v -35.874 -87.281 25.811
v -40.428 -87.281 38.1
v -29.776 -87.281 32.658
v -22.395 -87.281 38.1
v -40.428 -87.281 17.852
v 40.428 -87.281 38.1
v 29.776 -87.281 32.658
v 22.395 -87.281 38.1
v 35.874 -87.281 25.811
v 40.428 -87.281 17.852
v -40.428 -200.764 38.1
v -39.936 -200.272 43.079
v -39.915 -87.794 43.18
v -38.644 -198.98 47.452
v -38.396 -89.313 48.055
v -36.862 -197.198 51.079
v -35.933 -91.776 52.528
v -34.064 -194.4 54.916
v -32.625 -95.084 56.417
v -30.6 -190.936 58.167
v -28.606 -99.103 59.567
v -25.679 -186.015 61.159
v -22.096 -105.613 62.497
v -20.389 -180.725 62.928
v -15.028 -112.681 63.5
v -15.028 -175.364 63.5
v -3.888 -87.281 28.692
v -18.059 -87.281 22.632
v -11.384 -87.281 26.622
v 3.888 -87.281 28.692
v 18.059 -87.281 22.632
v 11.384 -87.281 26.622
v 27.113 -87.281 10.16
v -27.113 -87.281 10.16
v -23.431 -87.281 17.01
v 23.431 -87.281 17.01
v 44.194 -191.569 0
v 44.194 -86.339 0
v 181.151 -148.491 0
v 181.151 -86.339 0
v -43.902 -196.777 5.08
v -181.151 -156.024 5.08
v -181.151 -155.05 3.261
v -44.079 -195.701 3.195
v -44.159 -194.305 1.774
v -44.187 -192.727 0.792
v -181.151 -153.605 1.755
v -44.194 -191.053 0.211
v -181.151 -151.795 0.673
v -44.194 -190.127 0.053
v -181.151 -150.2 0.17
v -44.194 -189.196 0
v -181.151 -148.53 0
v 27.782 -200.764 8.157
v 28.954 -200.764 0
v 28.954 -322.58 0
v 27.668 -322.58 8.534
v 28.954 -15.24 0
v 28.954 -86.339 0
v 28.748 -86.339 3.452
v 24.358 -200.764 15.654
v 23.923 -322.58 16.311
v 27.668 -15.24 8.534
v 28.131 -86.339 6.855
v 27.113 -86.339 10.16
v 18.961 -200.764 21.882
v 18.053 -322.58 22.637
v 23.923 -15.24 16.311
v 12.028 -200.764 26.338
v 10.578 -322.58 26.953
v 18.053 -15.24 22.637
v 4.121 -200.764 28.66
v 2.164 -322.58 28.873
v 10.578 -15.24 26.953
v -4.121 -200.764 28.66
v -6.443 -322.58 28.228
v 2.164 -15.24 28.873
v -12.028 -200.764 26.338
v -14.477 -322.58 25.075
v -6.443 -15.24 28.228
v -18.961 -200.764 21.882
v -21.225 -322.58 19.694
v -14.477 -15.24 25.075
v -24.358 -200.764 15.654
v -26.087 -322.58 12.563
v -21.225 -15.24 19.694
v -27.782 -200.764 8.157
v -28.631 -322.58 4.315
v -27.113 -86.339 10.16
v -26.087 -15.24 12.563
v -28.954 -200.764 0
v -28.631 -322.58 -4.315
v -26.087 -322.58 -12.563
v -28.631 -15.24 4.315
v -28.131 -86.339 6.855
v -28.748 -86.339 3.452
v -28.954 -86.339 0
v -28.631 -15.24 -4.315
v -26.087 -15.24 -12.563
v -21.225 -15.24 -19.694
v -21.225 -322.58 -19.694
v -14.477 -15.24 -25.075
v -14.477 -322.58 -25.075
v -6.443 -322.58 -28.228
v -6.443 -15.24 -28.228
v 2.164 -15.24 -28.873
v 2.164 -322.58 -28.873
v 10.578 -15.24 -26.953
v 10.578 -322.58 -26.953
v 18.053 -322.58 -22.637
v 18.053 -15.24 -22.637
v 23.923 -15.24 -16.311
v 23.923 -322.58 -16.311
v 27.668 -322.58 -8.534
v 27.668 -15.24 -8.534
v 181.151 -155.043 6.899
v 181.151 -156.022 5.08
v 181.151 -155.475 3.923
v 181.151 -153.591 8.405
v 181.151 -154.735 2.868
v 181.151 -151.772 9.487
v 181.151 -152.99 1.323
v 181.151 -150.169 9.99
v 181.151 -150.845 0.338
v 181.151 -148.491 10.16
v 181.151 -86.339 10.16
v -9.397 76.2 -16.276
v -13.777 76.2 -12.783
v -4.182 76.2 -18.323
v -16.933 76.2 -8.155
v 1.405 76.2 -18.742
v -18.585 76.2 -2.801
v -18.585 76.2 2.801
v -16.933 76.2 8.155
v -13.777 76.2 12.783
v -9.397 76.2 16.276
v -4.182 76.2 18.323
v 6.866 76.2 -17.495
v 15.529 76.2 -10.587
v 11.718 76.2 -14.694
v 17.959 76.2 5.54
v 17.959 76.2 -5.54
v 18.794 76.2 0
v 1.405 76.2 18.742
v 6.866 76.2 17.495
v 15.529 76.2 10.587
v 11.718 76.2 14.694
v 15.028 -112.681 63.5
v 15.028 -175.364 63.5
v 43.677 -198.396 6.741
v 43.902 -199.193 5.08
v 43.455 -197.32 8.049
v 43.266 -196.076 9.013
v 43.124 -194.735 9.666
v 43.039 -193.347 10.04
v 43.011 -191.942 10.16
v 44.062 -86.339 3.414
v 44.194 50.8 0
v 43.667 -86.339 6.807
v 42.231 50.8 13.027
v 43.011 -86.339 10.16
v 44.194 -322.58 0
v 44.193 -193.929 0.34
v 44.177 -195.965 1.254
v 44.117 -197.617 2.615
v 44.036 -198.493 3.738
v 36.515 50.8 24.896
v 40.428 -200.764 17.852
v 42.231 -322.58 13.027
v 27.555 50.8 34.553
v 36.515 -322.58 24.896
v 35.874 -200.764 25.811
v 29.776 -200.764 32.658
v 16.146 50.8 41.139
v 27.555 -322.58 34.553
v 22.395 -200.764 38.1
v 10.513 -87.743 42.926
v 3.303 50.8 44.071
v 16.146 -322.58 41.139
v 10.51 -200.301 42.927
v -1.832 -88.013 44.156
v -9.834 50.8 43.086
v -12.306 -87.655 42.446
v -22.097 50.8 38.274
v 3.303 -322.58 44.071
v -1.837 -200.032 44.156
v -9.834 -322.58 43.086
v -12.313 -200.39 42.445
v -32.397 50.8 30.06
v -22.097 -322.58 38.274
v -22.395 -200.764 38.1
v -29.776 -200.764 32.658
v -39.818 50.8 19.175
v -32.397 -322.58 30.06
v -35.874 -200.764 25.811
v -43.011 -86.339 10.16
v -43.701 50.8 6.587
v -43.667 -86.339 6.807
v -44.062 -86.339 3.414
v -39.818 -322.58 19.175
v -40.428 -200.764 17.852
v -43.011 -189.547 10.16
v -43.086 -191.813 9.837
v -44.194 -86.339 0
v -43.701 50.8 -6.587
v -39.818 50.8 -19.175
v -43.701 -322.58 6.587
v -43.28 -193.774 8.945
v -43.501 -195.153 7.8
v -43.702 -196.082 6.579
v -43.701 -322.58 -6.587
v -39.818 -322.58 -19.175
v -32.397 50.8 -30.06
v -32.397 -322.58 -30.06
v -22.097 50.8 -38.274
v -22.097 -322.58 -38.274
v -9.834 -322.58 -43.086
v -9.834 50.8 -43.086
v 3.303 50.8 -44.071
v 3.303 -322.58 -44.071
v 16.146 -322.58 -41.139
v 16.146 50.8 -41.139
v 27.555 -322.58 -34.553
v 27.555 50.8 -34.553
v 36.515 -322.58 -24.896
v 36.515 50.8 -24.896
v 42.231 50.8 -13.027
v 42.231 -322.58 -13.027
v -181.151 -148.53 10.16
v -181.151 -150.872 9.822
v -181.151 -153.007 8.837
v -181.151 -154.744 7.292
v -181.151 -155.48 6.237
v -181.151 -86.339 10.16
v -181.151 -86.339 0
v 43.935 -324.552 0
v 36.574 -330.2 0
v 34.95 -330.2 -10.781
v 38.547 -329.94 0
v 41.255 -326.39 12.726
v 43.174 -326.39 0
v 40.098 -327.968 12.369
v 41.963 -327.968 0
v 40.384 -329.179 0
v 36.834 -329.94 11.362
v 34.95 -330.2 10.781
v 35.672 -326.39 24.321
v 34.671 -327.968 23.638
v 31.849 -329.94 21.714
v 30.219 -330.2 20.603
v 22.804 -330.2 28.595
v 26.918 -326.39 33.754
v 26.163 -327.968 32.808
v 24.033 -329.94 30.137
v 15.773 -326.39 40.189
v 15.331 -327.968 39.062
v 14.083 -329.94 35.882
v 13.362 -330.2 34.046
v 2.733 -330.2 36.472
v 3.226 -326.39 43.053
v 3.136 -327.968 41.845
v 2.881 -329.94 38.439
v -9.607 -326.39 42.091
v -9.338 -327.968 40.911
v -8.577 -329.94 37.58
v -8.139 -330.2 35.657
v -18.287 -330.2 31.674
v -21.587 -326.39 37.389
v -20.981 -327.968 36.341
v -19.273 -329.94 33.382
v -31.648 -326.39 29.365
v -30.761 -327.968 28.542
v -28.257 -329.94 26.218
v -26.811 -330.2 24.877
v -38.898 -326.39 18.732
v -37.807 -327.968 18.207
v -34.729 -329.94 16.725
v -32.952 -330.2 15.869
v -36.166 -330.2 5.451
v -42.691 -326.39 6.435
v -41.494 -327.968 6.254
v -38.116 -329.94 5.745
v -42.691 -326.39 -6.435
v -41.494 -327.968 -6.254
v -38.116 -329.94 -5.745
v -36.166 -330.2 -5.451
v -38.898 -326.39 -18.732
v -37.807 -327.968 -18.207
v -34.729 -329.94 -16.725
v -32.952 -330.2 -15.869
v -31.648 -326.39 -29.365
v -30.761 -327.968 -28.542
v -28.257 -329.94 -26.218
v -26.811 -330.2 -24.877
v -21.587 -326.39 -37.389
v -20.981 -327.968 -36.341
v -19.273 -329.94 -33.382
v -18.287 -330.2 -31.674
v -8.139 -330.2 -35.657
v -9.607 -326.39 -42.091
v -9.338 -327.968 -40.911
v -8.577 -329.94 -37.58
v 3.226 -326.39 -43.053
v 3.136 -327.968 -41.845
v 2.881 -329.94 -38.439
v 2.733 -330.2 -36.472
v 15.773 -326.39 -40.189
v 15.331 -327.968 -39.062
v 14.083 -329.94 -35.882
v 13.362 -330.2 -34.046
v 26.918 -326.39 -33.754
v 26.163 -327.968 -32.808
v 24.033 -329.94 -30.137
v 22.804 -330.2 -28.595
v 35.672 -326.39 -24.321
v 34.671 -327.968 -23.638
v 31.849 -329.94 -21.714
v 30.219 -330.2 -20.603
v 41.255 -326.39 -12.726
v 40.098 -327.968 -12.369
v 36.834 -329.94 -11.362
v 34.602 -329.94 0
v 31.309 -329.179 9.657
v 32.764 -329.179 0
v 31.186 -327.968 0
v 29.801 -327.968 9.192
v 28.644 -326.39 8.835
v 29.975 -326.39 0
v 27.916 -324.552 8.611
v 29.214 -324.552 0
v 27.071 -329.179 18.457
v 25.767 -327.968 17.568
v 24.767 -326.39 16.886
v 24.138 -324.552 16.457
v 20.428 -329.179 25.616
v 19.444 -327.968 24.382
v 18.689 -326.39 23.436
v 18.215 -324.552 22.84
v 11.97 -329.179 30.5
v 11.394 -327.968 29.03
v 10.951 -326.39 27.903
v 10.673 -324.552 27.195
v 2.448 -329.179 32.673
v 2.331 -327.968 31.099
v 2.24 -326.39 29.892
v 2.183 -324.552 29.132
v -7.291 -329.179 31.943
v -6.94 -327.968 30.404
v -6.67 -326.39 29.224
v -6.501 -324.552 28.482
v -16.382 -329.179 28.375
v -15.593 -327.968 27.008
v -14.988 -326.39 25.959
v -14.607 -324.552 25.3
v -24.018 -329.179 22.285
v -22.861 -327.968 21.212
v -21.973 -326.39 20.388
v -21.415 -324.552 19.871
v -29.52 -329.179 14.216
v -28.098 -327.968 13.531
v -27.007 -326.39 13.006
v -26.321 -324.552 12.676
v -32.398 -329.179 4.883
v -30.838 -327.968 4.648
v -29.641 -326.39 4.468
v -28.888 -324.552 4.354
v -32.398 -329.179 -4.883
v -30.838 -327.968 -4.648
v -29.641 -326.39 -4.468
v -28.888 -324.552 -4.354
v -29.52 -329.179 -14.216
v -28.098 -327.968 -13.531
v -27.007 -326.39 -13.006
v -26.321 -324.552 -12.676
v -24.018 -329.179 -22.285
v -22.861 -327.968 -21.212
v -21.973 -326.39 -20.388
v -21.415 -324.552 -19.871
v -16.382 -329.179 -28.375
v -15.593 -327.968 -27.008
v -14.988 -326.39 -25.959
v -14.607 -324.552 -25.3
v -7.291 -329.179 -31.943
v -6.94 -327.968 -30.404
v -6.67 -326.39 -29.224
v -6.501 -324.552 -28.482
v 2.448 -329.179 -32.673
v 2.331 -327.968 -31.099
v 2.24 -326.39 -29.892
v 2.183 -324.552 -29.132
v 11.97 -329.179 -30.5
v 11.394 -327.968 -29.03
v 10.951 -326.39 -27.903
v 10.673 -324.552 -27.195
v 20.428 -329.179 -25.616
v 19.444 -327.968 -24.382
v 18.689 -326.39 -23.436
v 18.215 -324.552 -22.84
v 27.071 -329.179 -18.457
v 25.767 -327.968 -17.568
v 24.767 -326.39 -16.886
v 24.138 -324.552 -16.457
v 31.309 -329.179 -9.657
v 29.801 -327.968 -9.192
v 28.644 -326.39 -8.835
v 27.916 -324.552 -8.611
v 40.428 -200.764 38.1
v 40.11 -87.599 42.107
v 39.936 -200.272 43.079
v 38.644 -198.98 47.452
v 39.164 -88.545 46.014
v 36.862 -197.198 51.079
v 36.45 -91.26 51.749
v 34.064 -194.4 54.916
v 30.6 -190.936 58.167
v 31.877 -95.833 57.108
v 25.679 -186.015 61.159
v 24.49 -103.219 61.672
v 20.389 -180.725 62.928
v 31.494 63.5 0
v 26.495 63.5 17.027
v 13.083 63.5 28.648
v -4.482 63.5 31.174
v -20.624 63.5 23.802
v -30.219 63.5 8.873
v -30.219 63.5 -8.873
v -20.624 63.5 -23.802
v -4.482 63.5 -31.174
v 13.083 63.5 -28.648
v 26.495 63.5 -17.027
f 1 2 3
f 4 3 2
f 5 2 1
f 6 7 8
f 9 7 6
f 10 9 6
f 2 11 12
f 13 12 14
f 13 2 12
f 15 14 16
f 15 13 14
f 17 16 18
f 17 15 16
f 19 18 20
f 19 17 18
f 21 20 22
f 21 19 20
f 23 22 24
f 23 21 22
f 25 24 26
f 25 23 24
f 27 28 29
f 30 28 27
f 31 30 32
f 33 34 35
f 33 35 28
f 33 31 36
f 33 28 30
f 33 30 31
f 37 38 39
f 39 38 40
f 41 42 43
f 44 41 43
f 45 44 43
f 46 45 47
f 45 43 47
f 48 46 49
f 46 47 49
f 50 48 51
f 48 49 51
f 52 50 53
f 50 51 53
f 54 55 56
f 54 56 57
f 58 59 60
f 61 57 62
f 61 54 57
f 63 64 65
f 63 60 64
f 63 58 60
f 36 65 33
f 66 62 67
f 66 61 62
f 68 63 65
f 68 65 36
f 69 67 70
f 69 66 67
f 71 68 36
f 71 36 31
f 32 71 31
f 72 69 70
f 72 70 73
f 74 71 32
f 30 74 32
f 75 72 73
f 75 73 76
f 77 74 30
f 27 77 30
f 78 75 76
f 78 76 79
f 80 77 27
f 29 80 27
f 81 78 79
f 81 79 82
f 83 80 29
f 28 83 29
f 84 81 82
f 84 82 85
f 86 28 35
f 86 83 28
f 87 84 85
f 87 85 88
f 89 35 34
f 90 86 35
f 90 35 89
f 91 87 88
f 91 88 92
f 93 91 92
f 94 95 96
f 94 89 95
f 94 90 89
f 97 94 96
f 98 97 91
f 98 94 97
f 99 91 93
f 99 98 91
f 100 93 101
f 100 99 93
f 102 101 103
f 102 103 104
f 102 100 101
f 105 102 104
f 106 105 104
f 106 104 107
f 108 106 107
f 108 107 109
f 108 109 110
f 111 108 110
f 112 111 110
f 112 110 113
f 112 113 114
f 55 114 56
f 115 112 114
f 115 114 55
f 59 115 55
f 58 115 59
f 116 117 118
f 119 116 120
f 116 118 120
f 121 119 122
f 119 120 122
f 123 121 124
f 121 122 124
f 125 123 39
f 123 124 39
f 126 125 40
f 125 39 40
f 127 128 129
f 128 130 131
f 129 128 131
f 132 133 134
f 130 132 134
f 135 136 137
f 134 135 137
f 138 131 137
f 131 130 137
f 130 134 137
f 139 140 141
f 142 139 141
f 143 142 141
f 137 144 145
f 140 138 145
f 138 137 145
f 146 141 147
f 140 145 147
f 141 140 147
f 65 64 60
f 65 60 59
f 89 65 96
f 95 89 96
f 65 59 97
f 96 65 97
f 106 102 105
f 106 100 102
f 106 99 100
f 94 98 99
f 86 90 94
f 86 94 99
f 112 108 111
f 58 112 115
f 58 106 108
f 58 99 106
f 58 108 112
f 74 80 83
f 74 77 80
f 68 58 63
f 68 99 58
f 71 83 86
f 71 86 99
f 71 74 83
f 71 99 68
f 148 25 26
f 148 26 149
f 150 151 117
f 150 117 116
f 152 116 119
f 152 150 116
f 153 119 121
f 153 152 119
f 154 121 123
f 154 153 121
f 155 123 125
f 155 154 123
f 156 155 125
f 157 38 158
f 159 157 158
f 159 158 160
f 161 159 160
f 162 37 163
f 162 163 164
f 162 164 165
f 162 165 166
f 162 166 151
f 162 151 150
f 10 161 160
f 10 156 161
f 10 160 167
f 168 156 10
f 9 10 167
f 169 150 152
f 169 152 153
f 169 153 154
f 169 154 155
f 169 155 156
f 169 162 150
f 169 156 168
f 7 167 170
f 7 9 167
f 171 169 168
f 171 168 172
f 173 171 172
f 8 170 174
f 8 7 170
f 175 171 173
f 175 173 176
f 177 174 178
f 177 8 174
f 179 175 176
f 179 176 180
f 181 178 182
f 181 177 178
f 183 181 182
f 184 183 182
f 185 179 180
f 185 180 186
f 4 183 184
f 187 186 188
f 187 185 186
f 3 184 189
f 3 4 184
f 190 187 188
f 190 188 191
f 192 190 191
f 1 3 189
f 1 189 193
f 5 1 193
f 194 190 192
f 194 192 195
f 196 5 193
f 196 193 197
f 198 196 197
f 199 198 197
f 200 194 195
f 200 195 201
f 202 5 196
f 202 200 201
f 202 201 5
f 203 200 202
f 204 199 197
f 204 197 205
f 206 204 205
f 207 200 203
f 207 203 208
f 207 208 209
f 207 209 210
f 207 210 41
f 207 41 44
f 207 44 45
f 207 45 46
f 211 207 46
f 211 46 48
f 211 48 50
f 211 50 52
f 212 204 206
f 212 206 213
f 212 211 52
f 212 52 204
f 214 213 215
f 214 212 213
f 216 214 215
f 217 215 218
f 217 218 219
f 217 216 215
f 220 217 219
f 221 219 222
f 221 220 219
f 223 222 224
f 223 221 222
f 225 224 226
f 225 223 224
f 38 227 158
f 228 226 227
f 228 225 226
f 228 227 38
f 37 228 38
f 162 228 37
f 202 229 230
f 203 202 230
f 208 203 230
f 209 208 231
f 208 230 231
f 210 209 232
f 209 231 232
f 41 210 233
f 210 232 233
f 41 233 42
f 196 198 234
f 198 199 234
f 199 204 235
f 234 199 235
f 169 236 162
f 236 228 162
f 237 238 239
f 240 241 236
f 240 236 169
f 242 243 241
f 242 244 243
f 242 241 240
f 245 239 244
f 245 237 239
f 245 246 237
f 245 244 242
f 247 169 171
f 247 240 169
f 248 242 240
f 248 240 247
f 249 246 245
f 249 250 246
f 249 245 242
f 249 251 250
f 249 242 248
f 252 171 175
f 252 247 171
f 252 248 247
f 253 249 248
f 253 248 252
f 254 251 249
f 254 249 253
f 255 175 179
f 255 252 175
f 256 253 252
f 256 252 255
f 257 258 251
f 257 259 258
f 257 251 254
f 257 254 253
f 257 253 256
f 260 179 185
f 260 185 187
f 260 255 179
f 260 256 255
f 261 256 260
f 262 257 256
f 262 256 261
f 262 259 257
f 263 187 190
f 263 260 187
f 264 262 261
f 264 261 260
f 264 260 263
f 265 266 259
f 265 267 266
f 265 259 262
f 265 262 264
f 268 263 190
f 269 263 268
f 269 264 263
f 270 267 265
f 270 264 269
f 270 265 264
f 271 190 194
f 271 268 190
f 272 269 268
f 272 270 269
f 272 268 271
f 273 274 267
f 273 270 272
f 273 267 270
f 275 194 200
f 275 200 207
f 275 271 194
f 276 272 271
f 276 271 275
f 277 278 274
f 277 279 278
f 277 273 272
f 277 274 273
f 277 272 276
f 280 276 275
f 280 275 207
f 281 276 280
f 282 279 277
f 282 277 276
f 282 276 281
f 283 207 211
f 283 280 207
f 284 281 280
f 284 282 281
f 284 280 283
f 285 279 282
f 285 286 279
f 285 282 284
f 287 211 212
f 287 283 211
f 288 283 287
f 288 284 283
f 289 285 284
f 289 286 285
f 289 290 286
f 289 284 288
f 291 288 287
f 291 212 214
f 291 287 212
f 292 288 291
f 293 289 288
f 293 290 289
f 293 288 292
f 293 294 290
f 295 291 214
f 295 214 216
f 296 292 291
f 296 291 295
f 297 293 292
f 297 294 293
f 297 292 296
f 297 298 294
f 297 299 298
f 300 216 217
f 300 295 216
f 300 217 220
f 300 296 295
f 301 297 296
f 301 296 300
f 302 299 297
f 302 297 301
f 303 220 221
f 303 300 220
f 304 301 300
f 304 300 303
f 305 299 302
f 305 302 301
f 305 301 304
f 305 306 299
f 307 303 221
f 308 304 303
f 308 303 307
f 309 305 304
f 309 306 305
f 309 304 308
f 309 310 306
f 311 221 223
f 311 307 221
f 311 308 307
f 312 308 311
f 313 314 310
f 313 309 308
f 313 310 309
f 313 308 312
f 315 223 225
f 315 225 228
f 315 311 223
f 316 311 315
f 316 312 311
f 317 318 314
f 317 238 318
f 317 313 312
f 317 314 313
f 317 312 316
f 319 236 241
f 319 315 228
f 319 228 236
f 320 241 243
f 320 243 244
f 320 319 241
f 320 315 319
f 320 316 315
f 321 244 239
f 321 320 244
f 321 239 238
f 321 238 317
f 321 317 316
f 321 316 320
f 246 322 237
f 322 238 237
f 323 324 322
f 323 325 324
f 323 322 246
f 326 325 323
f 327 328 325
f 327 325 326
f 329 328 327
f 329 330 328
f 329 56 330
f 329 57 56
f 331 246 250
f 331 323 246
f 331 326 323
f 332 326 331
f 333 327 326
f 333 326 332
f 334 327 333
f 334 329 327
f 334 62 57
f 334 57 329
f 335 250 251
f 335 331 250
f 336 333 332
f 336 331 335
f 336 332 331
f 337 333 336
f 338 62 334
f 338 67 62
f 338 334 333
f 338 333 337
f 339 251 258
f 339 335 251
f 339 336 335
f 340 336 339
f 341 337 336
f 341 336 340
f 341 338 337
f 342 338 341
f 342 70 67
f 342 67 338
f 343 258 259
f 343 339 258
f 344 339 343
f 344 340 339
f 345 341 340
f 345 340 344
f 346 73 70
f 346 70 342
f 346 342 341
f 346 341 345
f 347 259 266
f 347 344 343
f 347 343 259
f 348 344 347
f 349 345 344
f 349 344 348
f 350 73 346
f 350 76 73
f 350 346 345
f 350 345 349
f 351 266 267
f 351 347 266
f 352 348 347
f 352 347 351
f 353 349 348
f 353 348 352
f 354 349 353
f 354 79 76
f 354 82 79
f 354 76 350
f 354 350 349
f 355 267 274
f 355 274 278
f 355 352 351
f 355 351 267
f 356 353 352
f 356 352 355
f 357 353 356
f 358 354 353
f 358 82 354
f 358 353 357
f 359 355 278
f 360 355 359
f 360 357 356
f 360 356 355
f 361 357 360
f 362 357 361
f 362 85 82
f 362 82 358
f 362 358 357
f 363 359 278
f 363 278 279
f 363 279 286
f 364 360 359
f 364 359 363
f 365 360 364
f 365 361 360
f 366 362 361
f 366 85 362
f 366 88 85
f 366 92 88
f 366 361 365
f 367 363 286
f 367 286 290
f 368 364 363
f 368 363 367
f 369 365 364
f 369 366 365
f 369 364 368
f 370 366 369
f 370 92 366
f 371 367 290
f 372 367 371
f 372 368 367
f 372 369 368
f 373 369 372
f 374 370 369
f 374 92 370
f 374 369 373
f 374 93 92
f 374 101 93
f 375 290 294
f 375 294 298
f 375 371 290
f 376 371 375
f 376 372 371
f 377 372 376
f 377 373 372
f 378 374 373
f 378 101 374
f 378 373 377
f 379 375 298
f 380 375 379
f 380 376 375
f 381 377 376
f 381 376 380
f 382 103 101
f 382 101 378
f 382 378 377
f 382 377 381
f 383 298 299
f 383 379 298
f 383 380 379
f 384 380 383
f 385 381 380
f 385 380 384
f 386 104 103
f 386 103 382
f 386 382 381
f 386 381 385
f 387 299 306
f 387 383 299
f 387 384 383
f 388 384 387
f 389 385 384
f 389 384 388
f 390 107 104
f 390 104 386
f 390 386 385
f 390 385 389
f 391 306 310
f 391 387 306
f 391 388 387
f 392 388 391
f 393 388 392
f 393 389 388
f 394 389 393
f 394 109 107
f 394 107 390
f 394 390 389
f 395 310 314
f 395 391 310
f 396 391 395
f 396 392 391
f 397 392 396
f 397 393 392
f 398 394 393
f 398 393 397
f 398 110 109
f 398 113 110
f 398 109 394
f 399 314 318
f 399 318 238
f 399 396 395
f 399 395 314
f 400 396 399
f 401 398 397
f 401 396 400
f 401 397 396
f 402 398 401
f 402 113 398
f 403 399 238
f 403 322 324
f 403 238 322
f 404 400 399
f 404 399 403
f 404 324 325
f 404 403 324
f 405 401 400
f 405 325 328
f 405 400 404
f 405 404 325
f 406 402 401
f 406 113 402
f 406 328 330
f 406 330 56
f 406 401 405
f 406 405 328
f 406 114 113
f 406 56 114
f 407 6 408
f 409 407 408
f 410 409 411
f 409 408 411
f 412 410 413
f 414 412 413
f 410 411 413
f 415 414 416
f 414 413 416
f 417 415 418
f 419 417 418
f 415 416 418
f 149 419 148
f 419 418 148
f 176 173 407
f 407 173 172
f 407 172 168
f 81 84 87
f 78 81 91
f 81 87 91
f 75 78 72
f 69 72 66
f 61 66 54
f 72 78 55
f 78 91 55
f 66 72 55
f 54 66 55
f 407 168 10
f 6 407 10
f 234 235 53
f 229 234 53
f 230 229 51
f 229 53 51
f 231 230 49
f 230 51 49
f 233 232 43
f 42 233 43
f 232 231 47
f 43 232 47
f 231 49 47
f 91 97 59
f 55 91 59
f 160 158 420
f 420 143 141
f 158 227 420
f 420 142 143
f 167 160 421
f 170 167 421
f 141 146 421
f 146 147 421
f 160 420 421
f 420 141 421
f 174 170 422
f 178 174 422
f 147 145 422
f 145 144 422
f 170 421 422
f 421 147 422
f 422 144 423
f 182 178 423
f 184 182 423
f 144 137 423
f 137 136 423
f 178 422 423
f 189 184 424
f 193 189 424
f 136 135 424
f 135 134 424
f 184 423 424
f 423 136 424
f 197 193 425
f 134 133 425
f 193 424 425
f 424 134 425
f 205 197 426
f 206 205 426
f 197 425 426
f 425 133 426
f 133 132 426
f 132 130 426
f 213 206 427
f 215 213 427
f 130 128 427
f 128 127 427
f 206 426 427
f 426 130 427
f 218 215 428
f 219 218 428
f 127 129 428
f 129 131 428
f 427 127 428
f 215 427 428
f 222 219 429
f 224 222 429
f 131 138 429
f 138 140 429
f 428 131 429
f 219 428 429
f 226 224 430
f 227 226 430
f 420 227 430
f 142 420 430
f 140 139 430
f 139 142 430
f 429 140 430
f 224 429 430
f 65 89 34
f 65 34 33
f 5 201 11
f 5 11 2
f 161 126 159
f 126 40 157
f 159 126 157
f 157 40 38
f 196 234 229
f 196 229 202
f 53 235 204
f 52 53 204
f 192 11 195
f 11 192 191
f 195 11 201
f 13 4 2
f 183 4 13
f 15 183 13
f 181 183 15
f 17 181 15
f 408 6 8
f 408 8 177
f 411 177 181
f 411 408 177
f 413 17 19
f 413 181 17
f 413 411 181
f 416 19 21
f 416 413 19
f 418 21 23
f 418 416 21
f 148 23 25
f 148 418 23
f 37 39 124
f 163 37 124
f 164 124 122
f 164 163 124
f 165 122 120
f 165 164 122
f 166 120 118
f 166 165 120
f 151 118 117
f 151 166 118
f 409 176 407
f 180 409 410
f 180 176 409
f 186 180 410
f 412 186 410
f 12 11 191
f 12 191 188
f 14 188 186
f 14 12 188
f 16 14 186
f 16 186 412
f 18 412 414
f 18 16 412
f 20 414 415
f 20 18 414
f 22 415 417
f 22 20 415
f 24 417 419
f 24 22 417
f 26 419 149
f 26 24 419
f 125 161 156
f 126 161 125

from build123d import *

# Parameters (mm, degrees)
F0_R          = 44.1944447312
F1_DEPTH      = 330.2
F2_T          = -15.24
F3_R          = 7.61999
F4_DEPTH      = 76.2
F5_SIZE       = 25.4
F6_W          = 80.8569788933
F6_H          = 113.4834885597
F7_DEPTH      = 63.5
F8_T1_DEPTH   = 240.4834885597
F8_T6_DEPTH   = 207.8569788933
F8_S7_R       = 44.1944447312
F8_T8_DEPTH   = 107
F8_T12_DEPTH  = 207.8569788933
F8_S13_R      = 44.1944447312
F8_T14_DEPTH  = 107
F10_DEPTH     = 10.16
F11_T4_DEPTH  = 181.6717263284
F11_S5_R      = 44.1944447312
F11_T6_DEPTH  = 95
F11_T10_DEPTH = 182.9126104381
F11_S11_R     = 44.1944447312
F11_T12_DEPTH = 95
F11_T16_DEPTH = 182.201088869
F11_S17_R     = 44.1944447312
F11_T18_DEPTH = 95
F11_T22_DEPTH = 180.9663017132
F11_S23_R     = 44.1944447312
F11_T24_DEPTH = 94


# Not quite as in the source:
# - a fillet or chamfer that OpenCascade refuses, or shapes differently, is made with other operations: its cross-section is extruded or revolved along the edge and cut away or added
# - a fillet or chamfer is up to 0.001 mm smaller than in the source, because OpenCascade refuses the exact size


with BuildPart() as f1:
    # F0 (on Front) → F1 (new body)
    with BuildSketch(Plane.XZ):
        Circle(F0_R)
    extrude(amount=F1_DEPTH)

    # F2
    f2_openings = [f1.faces().sort_by_distance(p)[0] for p in [
        (0, -330.2, 0),
    ]]
    offset(amount=F2_T, openings=f2_openings)

    # F3 (radius 7.62 in the source; OpenCascade refuses exactly that, so slightly less here)
    f3_edges = [f1.edges().sort_by_distance(p)[0] for p in [
        (-44.194445, -330.2, 0),
        (-28.954445, -330.2, 0),
    ]]
    fillet(f3_edges, radius=F3_R)

    # F4 (add): a face of the model
    f4_faces = [f1.faces().sort_by_distance(p)[0] for p in [
        (0, 0, 0),
    ]]
    extrude(f4_faces, amount=F4_DEPTH)

    # F5
    f5_edges = [f1.edges().sort_by_distance(p)[0] for p in [
        (-44.194445, 76.2, 0),
    ]]
    chamfer(f5_edges, length=F5_SIZE)

    # F6 (on Top) → F7 (join)
    with BuildSketch(Plane.XY):
        with Locations((0, -144.0225243568)):
            Rectangle(F6_W, F6_H)
    extrude(amount=F7_DEPTH)

    # F8: fillet of radius 25.4 on 4 edges, made by hand

    # F8_s2 → F8_t1 (cut)
    with BuildSketch(Plane.XZ.offset(23.780780077)):
        with BuildLine():
            ThreePointArc((40.4284894466, 38.1), (32.9890016888, 56.0605122421), (15.0284894466, 63.5))
            Line((15.0284894466, 63.5), (40.4284894466, 63.5))
            Line((40.4284894466, 63.5), (40.4284894466, 38.1))
        make_face()
        with BuildLine():
            ThreePointArc((-40.4284894466, 38.1), (-32.9890016888, 56.0605122421), (-15.0284894466, 63.5))
            Line((-15.0284894466, 63.5), (-40.4284894466, 63.5))
            Line((-40.4284894466, 63.5), (-40.4284894466, 38.1))
        make_face()
    extrude(amount=F8_T1_DEPTH, mode=Mode.SUBTRACT)


with BuildPart() as f8_tool4:
    # F8_s5 → F8_t6 (new body)
    with BuildSketch(Plane.YZ.offset(103.9284894466)):
        with BuildLine():
            ThreePointArc((-87.280780077, 38.1), (-94.7202678348, 56.0605122421), (-112.680780077, 63.5))
            Line((-112.680780077, 63.5), (-87.280780077, 63.5))
            Line((-87.280780077, 63.5), (-87.280780077, 38.1))
        make_face()
    extrude(amount=-F8_T6_DEPTH)

    # F8_s7 → F8_t8 (cut, symmetric)
    with BuildSketch(Plane.XZ.offset(100)):
        Circle(F8_S7_R)
    extrude(amount=F8_T8_DEPTH, both=True, mode=Mode.SUBTRACT)


with BuildPart() as f1_1:
    add(f1.part)

    # F8_t3: cut F8_tool4
    add(f8_tool4.part, mode=Mode.SUBTRACT)


with BuildPart() as f8_tool10:
    # F8_s11 → F8_t12 (new body)
    with BuildSketch(Plane.YZ.offset(-103.9284894466)):
        with BuildLine():
            ThreePointArc((-200.7642686367, 38.1), (-193.3247808788, 56.0605122421), (-175.3642686367, 63.5))
            Line((-175.3642686367, 63.5), (-200.7642686367, 63.5))
            Line((-200.7642686367, 63.5), (-200.7642686367, 38.1))
        make_face()
    extrude(amount=F8_T12_DEPTH)

    # F8_s13 → F8_t14 (cut, symmetric)
    with BuildSketch(Plane.XZ.offset(188.1)):
        Circle(F8_S13_R)
    extrude(amount=F8_T14_DEPTH, both=True, mode=Mode.SUBTRACT)


with BuildPart() as f1_2:
    add(f1_1.part)

    # F8_t9: cut F8_tool10
    add(f8_tool10.part, mode=Mode.SUBTRACT)

    # F9 (on Top) → F10 (join)
    with BuildSketch(Plane.XY):
        Polygon((181.1510026455, -156.4789265394), (181.1510026455, -86.3388031721), (-181.1510026455, -86.3388031721), (-181.1510026455, -156.4789265394), (-40.541768074, -156.4789265394), (40.4533445835, -156.4789265394), align=None)
        Polygon((40.4533445835, -200.733974576), (181.1510026455, -156.4789265394), (40.4533445835, -156.4789265394), align=None)
        Polygon((-40.541768074, -156.4789265394), (-181.1510026455, -156.4789265394), (-40.541768074, -198.22897017), align=None)
    extrude(amount=F10_DEPTH)

    # F11: fillet of radius 7.62 on 4 edges, made by hand


with BuildPart() as f11_tool2:
    # F11_s3 → F11_t4 (new body)
    with BuildSketch(Plane(origin=(-35.0743442089, -11.0322858902, 0), x_dir=(0, 0, 1), z_dir=(0.9539242957, 0.3000473932, 0))):
        with BuildLine():
            ThreePointArc((0, 196.0029358997), (2.2318463274, 201.3910895724), (7.62, 203.6229358997))
            Line((7.62, 203.6229358997), (0, 203.6229358997))
            Line((0, 203.6229358997), (0, 196.0029358997))
        make_face()
    extrude(amount=F11_T4_DEPTH)

    # F11_s5 → F11_t6 (cut, symmetric)
    with BuildSketch(Plane.XZ.offset(174.4)):
        Circle(F11_S5_R)
    extrude(amount=F11_T6_DEPTH, both=True, mode=Mode.SUBTRACT)


with BuildPart() as f1_3:
    add(f1_2.part)

    # F11_t1: cut F11_tool2
    add(f11_tool2.part, mode=Mode.SUBTRACT)


with BuildPart() as f11_tool8:
    # F11_s9 → F11_t10 (new body)
    with BuildSketch(Plane(origin=(-36.2580537092, -11.4046099325, 0), x_dir=(0, 0, 1), z_dir=(0.9539242957, 0.3000473932, 0))):
        with BuildLine():
            ThreePointArc((2.54, 203.6229358997), (7.9281536726, 201.3910895724), (10.16, 196.0029358997))
            Line((10.16, 196.0029358997), (10.16, 203.6229358997))
            Line((10.16, 203.6229358997), (2.54, 203.6229358997))
        make_face()
    extrude(amount=F11_T10_DEPTH)

    # F11_s11 → F11_t12 (cut, symmetric)
    with BuildSketch(Plane.XZ.offset(174.6)):
        Circle(F11_S11_R)
    extrude(amount=F11_T12_DEPTH, both=True, mode=Mode.SUBTRACT)


with BuildPart() as f1_4:
    add(f1_3.part)

    # F11_t7: cut F11_tool8
    add(f11_tool8.part, mode=Mode.SUBTRACT)


with BuildPart() as f11_tool14:
    # F11_s15 → F11_t16 (new body)
    with BuildSketch(Plane(origin=(-142.0383828725, 42.1743898985, 0), x_dir=(0, 0, 1), z_dir=(0.9586344454, -0.2846401237, 0))):
        with BuildLine():
            ThreePointArc((10.16, 193.9489327682), (7.9281536726, 199.3370864408), (2.54, 201.5689327682))
            Line((2.54, 201.5689327682), (10.16, 201.5689327682))
            Line((10.16, 201.5689327682), (10.16, 193.9489327682))
        make_face()
    extrude(amount=F11_T16_DEPTH)

    # F11_s17 → F11_t18 (cut, symmetric)
    with BuildSketch(Plane.XZ.offset(173.3)):
        Circle(F11_S17_R)
    extrude(amount=F11_T18_DEPTH, both=True, mode=Mode.SUBTRACT)


with BuildPart() as f1_5:
    add(f1_4.part)

    # F11_t13: cut F11_tool14
    add(f11_tool14.part, mode=Mode.SUBTRACT)


with BuildPart() as f11_tool20:
    # F11_s21 → F11_t22 (new body)
    with BuildSketch(Plane(origin=(-142.0383828725, 42.1743898985, 0), x_dir=(0, 0, 1), z_dir=(0.9586344454, -0.2846401237, 0))):
        with BuildLine():
            ThreePointArc((7.62, 201.5689327682), (2.2318463274, 199.3370864408), (0, 193.9489327682))
            Line((0, 193.9489327682), (0, 201.5689327682))
            Line((0, 201.5689327682), (7.62, 201.5689327682))
        make_face()
    extrude(amount=F11_T22_DEPTH)

    # F11_s23 → F11_t24 (cut, symmetric)
    with BuildSketch(Plane.XZ.offset(173.2)):
        Circle(F11_S23_R)
    extrude(amount=F11_T24_DEPTH, both=True, mode=Mode.SUBTRACT)


with BuildPart() as f1_6:
    add(f1_5.part)

    # F11_t19: cut F11_tool20
    add(f11_tool20.part, mode=Mode.SUBTRACT)


solid = f1_6.part
